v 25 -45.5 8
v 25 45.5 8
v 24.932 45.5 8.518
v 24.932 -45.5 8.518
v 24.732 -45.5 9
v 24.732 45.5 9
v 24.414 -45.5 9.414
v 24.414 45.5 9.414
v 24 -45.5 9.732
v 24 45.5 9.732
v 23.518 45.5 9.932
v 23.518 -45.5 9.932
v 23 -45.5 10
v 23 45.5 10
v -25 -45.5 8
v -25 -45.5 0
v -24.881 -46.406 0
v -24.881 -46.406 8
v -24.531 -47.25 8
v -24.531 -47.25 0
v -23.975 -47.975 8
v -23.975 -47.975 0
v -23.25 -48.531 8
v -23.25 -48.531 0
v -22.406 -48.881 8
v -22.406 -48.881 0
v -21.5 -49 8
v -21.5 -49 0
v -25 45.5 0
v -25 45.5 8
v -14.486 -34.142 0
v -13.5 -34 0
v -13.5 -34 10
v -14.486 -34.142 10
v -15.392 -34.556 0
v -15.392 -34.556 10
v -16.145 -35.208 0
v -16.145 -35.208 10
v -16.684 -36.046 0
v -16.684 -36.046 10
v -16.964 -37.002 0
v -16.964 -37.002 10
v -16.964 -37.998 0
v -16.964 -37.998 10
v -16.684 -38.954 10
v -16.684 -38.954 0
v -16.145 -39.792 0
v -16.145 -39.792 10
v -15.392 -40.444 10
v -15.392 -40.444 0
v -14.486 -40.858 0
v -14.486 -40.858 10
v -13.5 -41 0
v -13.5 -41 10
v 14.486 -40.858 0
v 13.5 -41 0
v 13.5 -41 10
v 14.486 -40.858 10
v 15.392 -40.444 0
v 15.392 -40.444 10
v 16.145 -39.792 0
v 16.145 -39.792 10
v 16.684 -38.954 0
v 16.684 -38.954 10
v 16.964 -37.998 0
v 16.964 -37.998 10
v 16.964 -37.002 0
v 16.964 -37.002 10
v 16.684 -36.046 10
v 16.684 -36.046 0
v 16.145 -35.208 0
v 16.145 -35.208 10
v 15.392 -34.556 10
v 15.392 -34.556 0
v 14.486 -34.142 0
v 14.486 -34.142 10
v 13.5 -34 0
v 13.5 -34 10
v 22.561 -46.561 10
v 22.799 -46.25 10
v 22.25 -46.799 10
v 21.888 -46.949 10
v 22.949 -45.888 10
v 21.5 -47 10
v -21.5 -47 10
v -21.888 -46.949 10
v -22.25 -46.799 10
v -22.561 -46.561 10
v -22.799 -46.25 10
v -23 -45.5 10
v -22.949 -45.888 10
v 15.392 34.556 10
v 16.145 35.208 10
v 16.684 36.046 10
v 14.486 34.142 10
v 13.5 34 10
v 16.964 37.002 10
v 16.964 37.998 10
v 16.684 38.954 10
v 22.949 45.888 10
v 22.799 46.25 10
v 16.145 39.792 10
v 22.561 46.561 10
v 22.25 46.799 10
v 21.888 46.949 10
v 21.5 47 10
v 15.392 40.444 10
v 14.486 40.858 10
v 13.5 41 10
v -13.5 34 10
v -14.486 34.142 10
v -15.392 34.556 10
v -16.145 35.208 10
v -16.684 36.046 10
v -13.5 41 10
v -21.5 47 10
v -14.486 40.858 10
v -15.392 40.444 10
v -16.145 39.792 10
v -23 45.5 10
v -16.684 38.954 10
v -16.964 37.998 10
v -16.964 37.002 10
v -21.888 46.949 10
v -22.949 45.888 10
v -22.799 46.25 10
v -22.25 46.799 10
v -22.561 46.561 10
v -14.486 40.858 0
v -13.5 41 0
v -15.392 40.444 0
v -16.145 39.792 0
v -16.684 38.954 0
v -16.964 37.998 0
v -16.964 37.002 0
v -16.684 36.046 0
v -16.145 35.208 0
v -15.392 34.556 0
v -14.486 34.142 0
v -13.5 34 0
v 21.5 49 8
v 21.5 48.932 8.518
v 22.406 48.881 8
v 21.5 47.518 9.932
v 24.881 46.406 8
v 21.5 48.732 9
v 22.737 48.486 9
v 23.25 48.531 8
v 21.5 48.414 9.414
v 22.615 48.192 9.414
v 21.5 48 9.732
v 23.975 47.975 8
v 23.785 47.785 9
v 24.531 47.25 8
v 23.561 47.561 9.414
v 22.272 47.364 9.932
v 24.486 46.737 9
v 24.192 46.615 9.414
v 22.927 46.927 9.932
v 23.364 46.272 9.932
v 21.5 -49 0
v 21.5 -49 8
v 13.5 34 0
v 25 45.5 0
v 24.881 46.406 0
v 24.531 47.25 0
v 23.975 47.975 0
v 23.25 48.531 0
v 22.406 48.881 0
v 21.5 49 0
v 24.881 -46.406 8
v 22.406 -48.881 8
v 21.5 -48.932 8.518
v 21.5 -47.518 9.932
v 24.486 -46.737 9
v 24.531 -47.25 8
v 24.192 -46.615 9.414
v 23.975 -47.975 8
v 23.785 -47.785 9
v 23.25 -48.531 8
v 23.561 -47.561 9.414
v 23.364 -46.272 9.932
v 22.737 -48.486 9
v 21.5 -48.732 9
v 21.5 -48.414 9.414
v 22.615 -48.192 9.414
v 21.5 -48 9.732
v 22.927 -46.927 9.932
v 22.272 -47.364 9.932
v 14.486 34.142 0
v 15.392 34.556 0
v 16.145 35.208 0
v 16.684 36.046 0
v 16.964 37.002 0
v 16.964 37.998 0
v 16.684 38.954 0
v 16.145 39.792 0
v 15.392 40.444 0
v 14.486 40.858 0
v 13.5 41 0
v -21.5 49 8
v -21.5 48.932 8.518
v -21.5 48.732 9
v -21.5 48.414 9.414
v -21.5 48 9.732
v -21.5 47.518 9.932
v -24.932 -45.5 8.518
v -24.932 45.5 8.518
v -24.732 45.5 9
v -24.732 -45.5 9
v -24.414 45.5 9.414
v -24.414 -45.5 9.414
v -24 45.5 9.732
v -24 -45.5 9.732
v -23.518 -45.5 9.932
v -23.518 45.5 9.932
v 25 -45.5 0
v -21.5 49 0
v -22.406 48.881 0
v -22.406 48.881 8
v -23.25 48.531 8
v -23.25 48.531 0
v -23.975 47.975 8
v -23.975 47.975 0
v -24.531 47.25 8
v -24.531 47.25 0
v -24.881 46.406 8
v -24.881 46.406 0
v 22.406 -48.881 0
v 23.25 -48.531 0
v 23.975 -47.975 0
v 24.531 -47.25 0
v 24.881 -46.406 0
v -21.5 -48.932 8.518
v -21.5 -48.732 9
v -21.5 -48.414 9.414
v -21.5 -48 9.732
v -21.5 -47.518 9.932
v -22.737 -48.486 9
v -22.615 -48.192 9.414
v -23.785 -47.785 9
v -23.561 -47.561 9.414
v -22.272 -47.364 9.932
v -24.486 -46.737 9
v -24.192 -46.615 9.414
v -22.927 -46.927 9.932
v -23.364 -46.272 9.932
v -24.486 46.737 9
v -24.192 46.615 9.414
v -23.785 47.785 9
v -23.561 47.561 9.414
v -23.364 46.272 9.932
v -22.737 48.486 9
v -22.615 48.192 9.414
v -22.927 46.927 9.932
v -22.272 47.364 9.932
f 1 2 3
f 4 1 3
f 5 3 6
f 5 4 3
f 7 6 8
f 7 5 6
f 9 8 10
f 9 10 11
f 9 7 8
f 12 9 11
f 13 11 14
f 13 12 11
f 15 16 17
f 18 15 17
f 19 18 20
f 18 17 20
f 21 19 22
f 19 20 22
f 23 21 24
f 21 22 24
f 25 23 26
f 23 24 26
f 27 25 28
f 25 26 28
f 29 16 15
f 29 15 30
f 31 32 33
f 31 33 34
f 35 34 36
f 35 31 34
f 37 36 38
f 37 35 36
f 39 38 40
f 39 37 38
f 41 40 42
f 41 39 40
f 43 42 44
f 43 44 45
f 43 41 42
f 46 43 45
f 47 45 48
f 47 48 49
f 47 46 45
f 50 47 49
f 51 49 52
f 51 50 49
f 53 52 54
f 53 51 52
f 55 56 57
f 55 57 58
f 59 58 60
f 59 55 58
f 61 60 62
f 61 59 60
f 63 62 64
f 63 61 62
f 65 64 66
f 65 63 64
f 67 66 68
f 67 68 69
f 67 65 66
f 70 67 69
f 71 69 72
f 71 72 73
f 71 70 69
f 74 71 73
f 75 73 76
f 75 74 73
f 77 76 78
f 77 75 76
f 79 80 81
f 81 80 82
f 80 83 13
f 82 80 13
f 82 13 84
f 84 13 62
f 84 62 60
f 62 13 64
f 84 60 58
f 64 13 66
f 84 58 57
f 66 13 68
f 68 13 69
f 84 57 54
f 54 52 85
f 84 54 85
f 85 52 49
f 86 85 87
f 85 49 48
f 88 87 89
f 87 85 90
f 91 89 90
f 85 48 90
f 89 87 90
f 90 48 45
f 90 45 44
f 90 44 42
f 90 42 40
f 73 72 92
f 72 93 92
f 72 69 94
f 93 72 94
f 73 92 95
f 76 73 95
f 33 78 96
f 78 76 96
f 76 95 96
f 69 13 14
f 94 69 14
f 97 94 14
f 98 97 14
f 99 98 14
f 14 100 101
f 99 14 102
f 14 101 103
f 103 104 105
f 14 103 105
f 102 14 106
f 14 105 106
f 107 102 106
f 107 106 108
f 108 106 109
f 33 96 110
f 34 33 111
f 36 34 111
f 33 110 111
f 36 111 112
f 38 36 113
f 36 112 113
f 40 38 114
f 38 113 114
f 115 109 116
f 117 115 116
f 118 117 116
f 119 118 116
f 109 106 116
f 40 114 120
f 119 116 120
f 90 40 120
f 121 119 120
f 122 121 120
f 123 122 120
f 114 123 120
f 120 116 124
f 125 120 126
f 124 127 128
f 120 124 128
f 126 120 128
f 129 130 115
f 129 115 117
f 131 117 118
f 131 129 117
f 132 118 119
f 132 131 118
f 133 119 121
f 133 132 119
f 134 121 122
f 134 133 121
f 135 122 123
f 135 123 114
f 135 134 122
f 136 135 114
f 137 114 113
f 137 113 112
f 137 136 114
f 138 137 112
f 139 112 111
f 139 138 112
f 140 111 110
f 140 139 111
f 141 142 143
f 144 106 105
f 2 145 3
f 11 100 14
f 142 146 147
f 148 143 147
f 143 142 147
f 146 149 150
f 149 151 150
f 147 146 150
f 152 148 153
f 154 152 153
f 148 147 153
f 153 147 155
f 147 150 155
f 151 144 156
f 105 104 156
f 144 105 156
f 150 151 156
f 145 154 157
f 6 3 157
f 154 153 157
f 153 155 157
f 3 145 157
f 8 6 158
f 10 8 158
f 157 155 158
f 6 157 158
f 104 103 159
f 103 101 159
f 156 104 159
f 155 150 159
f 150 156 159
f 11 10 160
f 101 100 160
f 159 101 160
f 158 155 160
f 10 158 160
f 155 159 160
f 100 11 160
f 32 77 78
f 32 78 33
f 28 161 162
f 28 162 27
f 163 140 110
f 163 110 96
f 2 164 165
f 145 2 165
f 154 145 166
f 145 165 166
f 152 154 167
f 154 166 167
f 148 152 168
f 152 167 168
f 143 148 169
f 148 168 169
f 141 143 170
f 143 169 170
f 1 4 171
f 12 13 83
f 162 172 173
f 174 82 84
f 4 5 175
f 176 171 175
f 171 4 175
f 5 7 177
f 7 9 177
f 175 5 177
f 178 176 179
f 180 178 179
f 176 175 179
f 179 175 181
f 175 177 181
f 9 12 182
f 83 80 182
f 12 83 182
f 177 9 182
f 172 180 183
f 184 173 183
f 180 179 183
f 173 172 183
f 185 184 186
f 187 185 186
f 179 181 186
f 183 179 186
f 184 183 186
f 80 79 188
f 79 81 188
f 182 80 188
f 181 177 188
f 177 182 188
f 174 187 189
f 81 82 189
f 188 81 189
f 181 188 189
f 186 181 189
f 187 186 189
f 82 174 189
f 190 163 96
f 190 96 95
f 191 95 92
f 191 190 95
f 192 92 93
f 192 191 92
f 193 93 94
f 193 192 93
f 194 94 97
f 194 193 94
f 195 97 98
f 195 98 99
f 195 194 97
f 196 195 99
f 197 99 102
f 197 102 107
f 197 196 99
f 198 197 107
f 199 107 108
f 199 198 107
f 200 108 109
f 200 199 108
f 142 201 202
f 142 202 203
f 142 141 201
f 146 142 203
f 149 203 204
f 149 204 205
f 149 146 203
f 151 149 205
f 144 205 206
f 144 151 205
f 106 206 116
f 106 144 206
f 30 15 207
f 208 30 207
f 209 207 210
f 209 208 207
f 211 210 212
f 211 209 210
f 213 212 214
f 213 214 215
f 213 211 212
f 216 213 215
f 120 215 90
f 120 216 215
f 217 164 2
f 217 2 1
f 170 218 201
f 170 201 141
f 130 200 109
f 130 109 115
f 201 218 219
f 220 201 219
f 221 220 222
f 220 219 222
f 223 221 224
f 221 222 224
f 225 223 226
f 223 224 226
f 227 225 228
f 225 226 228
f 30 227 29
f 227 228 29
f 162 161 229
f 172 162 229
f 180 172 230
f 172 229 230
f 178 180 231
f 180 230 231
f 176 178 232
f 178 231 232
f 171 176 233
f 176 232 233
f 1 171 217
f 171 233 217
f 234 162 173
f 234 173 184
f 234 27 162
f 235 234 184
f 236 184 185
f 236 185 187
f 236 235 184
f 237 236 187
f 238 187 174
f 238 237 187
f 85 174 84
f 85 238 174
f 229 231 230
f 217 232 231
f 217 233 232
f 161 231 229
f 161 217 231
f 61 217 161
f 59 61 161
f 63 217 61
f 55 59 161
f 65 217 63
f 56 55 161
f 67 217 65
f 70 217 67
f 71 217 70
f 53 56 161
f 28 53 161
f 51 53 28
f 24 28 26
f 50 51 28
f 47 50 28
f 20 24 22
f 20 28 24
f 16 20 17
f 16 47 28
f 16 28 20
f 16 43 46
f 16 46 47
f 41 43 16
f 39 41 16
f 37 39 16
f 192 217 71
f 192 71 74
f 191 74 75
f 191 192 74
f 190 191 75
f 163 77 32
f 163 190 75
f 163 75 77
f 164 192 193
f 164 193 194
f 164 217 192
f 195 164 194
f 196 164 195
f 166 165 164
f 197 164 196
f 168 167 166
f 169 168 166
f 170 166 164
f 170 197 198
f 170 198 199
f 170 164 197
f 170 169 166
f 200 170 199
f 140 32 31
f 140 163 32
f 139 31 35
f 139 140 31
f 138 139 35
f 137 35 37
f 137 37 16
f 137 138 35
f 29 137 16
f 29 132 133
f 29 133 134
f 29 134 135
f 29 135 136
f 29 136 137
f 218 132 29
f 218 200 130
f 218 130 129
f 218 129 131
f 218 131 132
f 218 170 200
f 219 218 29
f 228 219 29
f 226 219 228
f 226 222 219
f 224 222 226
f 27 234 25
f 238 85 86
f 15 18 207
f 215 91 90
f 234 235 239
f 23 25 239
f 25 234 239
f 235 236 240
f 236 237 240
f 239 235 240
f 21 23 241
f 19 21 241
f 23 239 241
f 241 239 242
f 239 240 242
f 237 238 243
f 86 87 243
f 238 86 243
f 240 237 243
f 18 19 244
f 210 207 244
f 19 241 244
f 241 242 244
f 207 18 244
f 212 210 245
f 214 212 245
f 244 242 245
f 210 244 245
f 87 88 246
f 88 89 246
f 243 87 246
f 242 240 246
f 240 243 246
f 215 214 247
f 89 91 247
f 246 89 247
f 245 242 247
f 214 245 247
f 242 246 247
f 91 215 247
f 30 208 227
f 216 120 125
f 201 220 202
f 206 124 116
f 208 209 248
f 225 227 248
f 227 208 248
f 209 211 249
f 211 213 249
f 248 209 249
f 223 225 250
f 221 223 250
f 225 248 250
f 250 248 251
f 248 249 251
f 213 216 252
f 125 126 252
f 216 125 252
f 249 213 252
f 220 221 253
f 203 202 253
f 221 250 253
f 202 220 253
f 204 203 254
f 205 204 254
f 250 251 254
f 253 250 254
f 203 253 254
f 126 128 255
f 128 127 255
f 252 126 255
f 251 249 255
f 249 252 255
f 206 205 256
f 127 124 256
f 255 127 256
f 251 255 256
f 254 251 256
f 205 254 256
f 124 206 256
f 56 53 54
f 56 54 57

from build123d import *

# Parameters (mm, degrees)
PAD_DEPTH = 10
FILLET_R  = 2


with BuildPart() as part:
    # Sketch → Pad (new body)
    with BuildSketch(Plane.XY):
        with BuildLine():
            Line((-21.5, 49), (21.5, 49))
            ThreePointArc((25, 45.5), (23.974874, 47.974874), (21.5, 49))
            Line((25, 45.5), (25, -45.5))
            ThreePointArc((21.5, -49), (23.974874, -47.974874), (25, -45.5))
            Line((21.5, -49), (-21.5, -49))
            ThreePointArc((-25, -45.5), (-23.974874, -47.974874), (-21.5, -49))
            Line((-25, -45.5), (-25, 45.5))
            ThreePointArc((-21.5, 49), (-23.974874, 47.974874), (-25, 45.5))
        make_face()
        with BuildLine():
            ThreePointArc((-13.5, 41), (-17, 37.5), (-13.5, 34))
            Line((-13.5, 34), (13.5, 34))
            ThreePointArc((13.5, 34), (17, 37.5), (13.5, 41))
            Line((13.5, 41), (-13.5, 41))
        make_face(mode=Mode.SUBTRACT)
        with BuildLine():
            ThreePointArc((-13.5, -34), (-17, -37.5), (-13.5, -41))
            Line((-13.5, -41), (13.5, -41))
            ThreePointArc((13.5, -41), (17, -37.5), (13.5, -34))
            Line((13.5, -34), (-13.5, -34))
        make_face(mode=Mode.SUBTRACT)
    extrude(amount=PAD_DEPTH)

    # Fillet
    fillet_edges = [part.edges().sort_by_distance(p)[0] for p in [
        (-25, 0, 10),
    ]]
    fillet(fillet_edges, radius=FILLET_R)


solid = part.part
